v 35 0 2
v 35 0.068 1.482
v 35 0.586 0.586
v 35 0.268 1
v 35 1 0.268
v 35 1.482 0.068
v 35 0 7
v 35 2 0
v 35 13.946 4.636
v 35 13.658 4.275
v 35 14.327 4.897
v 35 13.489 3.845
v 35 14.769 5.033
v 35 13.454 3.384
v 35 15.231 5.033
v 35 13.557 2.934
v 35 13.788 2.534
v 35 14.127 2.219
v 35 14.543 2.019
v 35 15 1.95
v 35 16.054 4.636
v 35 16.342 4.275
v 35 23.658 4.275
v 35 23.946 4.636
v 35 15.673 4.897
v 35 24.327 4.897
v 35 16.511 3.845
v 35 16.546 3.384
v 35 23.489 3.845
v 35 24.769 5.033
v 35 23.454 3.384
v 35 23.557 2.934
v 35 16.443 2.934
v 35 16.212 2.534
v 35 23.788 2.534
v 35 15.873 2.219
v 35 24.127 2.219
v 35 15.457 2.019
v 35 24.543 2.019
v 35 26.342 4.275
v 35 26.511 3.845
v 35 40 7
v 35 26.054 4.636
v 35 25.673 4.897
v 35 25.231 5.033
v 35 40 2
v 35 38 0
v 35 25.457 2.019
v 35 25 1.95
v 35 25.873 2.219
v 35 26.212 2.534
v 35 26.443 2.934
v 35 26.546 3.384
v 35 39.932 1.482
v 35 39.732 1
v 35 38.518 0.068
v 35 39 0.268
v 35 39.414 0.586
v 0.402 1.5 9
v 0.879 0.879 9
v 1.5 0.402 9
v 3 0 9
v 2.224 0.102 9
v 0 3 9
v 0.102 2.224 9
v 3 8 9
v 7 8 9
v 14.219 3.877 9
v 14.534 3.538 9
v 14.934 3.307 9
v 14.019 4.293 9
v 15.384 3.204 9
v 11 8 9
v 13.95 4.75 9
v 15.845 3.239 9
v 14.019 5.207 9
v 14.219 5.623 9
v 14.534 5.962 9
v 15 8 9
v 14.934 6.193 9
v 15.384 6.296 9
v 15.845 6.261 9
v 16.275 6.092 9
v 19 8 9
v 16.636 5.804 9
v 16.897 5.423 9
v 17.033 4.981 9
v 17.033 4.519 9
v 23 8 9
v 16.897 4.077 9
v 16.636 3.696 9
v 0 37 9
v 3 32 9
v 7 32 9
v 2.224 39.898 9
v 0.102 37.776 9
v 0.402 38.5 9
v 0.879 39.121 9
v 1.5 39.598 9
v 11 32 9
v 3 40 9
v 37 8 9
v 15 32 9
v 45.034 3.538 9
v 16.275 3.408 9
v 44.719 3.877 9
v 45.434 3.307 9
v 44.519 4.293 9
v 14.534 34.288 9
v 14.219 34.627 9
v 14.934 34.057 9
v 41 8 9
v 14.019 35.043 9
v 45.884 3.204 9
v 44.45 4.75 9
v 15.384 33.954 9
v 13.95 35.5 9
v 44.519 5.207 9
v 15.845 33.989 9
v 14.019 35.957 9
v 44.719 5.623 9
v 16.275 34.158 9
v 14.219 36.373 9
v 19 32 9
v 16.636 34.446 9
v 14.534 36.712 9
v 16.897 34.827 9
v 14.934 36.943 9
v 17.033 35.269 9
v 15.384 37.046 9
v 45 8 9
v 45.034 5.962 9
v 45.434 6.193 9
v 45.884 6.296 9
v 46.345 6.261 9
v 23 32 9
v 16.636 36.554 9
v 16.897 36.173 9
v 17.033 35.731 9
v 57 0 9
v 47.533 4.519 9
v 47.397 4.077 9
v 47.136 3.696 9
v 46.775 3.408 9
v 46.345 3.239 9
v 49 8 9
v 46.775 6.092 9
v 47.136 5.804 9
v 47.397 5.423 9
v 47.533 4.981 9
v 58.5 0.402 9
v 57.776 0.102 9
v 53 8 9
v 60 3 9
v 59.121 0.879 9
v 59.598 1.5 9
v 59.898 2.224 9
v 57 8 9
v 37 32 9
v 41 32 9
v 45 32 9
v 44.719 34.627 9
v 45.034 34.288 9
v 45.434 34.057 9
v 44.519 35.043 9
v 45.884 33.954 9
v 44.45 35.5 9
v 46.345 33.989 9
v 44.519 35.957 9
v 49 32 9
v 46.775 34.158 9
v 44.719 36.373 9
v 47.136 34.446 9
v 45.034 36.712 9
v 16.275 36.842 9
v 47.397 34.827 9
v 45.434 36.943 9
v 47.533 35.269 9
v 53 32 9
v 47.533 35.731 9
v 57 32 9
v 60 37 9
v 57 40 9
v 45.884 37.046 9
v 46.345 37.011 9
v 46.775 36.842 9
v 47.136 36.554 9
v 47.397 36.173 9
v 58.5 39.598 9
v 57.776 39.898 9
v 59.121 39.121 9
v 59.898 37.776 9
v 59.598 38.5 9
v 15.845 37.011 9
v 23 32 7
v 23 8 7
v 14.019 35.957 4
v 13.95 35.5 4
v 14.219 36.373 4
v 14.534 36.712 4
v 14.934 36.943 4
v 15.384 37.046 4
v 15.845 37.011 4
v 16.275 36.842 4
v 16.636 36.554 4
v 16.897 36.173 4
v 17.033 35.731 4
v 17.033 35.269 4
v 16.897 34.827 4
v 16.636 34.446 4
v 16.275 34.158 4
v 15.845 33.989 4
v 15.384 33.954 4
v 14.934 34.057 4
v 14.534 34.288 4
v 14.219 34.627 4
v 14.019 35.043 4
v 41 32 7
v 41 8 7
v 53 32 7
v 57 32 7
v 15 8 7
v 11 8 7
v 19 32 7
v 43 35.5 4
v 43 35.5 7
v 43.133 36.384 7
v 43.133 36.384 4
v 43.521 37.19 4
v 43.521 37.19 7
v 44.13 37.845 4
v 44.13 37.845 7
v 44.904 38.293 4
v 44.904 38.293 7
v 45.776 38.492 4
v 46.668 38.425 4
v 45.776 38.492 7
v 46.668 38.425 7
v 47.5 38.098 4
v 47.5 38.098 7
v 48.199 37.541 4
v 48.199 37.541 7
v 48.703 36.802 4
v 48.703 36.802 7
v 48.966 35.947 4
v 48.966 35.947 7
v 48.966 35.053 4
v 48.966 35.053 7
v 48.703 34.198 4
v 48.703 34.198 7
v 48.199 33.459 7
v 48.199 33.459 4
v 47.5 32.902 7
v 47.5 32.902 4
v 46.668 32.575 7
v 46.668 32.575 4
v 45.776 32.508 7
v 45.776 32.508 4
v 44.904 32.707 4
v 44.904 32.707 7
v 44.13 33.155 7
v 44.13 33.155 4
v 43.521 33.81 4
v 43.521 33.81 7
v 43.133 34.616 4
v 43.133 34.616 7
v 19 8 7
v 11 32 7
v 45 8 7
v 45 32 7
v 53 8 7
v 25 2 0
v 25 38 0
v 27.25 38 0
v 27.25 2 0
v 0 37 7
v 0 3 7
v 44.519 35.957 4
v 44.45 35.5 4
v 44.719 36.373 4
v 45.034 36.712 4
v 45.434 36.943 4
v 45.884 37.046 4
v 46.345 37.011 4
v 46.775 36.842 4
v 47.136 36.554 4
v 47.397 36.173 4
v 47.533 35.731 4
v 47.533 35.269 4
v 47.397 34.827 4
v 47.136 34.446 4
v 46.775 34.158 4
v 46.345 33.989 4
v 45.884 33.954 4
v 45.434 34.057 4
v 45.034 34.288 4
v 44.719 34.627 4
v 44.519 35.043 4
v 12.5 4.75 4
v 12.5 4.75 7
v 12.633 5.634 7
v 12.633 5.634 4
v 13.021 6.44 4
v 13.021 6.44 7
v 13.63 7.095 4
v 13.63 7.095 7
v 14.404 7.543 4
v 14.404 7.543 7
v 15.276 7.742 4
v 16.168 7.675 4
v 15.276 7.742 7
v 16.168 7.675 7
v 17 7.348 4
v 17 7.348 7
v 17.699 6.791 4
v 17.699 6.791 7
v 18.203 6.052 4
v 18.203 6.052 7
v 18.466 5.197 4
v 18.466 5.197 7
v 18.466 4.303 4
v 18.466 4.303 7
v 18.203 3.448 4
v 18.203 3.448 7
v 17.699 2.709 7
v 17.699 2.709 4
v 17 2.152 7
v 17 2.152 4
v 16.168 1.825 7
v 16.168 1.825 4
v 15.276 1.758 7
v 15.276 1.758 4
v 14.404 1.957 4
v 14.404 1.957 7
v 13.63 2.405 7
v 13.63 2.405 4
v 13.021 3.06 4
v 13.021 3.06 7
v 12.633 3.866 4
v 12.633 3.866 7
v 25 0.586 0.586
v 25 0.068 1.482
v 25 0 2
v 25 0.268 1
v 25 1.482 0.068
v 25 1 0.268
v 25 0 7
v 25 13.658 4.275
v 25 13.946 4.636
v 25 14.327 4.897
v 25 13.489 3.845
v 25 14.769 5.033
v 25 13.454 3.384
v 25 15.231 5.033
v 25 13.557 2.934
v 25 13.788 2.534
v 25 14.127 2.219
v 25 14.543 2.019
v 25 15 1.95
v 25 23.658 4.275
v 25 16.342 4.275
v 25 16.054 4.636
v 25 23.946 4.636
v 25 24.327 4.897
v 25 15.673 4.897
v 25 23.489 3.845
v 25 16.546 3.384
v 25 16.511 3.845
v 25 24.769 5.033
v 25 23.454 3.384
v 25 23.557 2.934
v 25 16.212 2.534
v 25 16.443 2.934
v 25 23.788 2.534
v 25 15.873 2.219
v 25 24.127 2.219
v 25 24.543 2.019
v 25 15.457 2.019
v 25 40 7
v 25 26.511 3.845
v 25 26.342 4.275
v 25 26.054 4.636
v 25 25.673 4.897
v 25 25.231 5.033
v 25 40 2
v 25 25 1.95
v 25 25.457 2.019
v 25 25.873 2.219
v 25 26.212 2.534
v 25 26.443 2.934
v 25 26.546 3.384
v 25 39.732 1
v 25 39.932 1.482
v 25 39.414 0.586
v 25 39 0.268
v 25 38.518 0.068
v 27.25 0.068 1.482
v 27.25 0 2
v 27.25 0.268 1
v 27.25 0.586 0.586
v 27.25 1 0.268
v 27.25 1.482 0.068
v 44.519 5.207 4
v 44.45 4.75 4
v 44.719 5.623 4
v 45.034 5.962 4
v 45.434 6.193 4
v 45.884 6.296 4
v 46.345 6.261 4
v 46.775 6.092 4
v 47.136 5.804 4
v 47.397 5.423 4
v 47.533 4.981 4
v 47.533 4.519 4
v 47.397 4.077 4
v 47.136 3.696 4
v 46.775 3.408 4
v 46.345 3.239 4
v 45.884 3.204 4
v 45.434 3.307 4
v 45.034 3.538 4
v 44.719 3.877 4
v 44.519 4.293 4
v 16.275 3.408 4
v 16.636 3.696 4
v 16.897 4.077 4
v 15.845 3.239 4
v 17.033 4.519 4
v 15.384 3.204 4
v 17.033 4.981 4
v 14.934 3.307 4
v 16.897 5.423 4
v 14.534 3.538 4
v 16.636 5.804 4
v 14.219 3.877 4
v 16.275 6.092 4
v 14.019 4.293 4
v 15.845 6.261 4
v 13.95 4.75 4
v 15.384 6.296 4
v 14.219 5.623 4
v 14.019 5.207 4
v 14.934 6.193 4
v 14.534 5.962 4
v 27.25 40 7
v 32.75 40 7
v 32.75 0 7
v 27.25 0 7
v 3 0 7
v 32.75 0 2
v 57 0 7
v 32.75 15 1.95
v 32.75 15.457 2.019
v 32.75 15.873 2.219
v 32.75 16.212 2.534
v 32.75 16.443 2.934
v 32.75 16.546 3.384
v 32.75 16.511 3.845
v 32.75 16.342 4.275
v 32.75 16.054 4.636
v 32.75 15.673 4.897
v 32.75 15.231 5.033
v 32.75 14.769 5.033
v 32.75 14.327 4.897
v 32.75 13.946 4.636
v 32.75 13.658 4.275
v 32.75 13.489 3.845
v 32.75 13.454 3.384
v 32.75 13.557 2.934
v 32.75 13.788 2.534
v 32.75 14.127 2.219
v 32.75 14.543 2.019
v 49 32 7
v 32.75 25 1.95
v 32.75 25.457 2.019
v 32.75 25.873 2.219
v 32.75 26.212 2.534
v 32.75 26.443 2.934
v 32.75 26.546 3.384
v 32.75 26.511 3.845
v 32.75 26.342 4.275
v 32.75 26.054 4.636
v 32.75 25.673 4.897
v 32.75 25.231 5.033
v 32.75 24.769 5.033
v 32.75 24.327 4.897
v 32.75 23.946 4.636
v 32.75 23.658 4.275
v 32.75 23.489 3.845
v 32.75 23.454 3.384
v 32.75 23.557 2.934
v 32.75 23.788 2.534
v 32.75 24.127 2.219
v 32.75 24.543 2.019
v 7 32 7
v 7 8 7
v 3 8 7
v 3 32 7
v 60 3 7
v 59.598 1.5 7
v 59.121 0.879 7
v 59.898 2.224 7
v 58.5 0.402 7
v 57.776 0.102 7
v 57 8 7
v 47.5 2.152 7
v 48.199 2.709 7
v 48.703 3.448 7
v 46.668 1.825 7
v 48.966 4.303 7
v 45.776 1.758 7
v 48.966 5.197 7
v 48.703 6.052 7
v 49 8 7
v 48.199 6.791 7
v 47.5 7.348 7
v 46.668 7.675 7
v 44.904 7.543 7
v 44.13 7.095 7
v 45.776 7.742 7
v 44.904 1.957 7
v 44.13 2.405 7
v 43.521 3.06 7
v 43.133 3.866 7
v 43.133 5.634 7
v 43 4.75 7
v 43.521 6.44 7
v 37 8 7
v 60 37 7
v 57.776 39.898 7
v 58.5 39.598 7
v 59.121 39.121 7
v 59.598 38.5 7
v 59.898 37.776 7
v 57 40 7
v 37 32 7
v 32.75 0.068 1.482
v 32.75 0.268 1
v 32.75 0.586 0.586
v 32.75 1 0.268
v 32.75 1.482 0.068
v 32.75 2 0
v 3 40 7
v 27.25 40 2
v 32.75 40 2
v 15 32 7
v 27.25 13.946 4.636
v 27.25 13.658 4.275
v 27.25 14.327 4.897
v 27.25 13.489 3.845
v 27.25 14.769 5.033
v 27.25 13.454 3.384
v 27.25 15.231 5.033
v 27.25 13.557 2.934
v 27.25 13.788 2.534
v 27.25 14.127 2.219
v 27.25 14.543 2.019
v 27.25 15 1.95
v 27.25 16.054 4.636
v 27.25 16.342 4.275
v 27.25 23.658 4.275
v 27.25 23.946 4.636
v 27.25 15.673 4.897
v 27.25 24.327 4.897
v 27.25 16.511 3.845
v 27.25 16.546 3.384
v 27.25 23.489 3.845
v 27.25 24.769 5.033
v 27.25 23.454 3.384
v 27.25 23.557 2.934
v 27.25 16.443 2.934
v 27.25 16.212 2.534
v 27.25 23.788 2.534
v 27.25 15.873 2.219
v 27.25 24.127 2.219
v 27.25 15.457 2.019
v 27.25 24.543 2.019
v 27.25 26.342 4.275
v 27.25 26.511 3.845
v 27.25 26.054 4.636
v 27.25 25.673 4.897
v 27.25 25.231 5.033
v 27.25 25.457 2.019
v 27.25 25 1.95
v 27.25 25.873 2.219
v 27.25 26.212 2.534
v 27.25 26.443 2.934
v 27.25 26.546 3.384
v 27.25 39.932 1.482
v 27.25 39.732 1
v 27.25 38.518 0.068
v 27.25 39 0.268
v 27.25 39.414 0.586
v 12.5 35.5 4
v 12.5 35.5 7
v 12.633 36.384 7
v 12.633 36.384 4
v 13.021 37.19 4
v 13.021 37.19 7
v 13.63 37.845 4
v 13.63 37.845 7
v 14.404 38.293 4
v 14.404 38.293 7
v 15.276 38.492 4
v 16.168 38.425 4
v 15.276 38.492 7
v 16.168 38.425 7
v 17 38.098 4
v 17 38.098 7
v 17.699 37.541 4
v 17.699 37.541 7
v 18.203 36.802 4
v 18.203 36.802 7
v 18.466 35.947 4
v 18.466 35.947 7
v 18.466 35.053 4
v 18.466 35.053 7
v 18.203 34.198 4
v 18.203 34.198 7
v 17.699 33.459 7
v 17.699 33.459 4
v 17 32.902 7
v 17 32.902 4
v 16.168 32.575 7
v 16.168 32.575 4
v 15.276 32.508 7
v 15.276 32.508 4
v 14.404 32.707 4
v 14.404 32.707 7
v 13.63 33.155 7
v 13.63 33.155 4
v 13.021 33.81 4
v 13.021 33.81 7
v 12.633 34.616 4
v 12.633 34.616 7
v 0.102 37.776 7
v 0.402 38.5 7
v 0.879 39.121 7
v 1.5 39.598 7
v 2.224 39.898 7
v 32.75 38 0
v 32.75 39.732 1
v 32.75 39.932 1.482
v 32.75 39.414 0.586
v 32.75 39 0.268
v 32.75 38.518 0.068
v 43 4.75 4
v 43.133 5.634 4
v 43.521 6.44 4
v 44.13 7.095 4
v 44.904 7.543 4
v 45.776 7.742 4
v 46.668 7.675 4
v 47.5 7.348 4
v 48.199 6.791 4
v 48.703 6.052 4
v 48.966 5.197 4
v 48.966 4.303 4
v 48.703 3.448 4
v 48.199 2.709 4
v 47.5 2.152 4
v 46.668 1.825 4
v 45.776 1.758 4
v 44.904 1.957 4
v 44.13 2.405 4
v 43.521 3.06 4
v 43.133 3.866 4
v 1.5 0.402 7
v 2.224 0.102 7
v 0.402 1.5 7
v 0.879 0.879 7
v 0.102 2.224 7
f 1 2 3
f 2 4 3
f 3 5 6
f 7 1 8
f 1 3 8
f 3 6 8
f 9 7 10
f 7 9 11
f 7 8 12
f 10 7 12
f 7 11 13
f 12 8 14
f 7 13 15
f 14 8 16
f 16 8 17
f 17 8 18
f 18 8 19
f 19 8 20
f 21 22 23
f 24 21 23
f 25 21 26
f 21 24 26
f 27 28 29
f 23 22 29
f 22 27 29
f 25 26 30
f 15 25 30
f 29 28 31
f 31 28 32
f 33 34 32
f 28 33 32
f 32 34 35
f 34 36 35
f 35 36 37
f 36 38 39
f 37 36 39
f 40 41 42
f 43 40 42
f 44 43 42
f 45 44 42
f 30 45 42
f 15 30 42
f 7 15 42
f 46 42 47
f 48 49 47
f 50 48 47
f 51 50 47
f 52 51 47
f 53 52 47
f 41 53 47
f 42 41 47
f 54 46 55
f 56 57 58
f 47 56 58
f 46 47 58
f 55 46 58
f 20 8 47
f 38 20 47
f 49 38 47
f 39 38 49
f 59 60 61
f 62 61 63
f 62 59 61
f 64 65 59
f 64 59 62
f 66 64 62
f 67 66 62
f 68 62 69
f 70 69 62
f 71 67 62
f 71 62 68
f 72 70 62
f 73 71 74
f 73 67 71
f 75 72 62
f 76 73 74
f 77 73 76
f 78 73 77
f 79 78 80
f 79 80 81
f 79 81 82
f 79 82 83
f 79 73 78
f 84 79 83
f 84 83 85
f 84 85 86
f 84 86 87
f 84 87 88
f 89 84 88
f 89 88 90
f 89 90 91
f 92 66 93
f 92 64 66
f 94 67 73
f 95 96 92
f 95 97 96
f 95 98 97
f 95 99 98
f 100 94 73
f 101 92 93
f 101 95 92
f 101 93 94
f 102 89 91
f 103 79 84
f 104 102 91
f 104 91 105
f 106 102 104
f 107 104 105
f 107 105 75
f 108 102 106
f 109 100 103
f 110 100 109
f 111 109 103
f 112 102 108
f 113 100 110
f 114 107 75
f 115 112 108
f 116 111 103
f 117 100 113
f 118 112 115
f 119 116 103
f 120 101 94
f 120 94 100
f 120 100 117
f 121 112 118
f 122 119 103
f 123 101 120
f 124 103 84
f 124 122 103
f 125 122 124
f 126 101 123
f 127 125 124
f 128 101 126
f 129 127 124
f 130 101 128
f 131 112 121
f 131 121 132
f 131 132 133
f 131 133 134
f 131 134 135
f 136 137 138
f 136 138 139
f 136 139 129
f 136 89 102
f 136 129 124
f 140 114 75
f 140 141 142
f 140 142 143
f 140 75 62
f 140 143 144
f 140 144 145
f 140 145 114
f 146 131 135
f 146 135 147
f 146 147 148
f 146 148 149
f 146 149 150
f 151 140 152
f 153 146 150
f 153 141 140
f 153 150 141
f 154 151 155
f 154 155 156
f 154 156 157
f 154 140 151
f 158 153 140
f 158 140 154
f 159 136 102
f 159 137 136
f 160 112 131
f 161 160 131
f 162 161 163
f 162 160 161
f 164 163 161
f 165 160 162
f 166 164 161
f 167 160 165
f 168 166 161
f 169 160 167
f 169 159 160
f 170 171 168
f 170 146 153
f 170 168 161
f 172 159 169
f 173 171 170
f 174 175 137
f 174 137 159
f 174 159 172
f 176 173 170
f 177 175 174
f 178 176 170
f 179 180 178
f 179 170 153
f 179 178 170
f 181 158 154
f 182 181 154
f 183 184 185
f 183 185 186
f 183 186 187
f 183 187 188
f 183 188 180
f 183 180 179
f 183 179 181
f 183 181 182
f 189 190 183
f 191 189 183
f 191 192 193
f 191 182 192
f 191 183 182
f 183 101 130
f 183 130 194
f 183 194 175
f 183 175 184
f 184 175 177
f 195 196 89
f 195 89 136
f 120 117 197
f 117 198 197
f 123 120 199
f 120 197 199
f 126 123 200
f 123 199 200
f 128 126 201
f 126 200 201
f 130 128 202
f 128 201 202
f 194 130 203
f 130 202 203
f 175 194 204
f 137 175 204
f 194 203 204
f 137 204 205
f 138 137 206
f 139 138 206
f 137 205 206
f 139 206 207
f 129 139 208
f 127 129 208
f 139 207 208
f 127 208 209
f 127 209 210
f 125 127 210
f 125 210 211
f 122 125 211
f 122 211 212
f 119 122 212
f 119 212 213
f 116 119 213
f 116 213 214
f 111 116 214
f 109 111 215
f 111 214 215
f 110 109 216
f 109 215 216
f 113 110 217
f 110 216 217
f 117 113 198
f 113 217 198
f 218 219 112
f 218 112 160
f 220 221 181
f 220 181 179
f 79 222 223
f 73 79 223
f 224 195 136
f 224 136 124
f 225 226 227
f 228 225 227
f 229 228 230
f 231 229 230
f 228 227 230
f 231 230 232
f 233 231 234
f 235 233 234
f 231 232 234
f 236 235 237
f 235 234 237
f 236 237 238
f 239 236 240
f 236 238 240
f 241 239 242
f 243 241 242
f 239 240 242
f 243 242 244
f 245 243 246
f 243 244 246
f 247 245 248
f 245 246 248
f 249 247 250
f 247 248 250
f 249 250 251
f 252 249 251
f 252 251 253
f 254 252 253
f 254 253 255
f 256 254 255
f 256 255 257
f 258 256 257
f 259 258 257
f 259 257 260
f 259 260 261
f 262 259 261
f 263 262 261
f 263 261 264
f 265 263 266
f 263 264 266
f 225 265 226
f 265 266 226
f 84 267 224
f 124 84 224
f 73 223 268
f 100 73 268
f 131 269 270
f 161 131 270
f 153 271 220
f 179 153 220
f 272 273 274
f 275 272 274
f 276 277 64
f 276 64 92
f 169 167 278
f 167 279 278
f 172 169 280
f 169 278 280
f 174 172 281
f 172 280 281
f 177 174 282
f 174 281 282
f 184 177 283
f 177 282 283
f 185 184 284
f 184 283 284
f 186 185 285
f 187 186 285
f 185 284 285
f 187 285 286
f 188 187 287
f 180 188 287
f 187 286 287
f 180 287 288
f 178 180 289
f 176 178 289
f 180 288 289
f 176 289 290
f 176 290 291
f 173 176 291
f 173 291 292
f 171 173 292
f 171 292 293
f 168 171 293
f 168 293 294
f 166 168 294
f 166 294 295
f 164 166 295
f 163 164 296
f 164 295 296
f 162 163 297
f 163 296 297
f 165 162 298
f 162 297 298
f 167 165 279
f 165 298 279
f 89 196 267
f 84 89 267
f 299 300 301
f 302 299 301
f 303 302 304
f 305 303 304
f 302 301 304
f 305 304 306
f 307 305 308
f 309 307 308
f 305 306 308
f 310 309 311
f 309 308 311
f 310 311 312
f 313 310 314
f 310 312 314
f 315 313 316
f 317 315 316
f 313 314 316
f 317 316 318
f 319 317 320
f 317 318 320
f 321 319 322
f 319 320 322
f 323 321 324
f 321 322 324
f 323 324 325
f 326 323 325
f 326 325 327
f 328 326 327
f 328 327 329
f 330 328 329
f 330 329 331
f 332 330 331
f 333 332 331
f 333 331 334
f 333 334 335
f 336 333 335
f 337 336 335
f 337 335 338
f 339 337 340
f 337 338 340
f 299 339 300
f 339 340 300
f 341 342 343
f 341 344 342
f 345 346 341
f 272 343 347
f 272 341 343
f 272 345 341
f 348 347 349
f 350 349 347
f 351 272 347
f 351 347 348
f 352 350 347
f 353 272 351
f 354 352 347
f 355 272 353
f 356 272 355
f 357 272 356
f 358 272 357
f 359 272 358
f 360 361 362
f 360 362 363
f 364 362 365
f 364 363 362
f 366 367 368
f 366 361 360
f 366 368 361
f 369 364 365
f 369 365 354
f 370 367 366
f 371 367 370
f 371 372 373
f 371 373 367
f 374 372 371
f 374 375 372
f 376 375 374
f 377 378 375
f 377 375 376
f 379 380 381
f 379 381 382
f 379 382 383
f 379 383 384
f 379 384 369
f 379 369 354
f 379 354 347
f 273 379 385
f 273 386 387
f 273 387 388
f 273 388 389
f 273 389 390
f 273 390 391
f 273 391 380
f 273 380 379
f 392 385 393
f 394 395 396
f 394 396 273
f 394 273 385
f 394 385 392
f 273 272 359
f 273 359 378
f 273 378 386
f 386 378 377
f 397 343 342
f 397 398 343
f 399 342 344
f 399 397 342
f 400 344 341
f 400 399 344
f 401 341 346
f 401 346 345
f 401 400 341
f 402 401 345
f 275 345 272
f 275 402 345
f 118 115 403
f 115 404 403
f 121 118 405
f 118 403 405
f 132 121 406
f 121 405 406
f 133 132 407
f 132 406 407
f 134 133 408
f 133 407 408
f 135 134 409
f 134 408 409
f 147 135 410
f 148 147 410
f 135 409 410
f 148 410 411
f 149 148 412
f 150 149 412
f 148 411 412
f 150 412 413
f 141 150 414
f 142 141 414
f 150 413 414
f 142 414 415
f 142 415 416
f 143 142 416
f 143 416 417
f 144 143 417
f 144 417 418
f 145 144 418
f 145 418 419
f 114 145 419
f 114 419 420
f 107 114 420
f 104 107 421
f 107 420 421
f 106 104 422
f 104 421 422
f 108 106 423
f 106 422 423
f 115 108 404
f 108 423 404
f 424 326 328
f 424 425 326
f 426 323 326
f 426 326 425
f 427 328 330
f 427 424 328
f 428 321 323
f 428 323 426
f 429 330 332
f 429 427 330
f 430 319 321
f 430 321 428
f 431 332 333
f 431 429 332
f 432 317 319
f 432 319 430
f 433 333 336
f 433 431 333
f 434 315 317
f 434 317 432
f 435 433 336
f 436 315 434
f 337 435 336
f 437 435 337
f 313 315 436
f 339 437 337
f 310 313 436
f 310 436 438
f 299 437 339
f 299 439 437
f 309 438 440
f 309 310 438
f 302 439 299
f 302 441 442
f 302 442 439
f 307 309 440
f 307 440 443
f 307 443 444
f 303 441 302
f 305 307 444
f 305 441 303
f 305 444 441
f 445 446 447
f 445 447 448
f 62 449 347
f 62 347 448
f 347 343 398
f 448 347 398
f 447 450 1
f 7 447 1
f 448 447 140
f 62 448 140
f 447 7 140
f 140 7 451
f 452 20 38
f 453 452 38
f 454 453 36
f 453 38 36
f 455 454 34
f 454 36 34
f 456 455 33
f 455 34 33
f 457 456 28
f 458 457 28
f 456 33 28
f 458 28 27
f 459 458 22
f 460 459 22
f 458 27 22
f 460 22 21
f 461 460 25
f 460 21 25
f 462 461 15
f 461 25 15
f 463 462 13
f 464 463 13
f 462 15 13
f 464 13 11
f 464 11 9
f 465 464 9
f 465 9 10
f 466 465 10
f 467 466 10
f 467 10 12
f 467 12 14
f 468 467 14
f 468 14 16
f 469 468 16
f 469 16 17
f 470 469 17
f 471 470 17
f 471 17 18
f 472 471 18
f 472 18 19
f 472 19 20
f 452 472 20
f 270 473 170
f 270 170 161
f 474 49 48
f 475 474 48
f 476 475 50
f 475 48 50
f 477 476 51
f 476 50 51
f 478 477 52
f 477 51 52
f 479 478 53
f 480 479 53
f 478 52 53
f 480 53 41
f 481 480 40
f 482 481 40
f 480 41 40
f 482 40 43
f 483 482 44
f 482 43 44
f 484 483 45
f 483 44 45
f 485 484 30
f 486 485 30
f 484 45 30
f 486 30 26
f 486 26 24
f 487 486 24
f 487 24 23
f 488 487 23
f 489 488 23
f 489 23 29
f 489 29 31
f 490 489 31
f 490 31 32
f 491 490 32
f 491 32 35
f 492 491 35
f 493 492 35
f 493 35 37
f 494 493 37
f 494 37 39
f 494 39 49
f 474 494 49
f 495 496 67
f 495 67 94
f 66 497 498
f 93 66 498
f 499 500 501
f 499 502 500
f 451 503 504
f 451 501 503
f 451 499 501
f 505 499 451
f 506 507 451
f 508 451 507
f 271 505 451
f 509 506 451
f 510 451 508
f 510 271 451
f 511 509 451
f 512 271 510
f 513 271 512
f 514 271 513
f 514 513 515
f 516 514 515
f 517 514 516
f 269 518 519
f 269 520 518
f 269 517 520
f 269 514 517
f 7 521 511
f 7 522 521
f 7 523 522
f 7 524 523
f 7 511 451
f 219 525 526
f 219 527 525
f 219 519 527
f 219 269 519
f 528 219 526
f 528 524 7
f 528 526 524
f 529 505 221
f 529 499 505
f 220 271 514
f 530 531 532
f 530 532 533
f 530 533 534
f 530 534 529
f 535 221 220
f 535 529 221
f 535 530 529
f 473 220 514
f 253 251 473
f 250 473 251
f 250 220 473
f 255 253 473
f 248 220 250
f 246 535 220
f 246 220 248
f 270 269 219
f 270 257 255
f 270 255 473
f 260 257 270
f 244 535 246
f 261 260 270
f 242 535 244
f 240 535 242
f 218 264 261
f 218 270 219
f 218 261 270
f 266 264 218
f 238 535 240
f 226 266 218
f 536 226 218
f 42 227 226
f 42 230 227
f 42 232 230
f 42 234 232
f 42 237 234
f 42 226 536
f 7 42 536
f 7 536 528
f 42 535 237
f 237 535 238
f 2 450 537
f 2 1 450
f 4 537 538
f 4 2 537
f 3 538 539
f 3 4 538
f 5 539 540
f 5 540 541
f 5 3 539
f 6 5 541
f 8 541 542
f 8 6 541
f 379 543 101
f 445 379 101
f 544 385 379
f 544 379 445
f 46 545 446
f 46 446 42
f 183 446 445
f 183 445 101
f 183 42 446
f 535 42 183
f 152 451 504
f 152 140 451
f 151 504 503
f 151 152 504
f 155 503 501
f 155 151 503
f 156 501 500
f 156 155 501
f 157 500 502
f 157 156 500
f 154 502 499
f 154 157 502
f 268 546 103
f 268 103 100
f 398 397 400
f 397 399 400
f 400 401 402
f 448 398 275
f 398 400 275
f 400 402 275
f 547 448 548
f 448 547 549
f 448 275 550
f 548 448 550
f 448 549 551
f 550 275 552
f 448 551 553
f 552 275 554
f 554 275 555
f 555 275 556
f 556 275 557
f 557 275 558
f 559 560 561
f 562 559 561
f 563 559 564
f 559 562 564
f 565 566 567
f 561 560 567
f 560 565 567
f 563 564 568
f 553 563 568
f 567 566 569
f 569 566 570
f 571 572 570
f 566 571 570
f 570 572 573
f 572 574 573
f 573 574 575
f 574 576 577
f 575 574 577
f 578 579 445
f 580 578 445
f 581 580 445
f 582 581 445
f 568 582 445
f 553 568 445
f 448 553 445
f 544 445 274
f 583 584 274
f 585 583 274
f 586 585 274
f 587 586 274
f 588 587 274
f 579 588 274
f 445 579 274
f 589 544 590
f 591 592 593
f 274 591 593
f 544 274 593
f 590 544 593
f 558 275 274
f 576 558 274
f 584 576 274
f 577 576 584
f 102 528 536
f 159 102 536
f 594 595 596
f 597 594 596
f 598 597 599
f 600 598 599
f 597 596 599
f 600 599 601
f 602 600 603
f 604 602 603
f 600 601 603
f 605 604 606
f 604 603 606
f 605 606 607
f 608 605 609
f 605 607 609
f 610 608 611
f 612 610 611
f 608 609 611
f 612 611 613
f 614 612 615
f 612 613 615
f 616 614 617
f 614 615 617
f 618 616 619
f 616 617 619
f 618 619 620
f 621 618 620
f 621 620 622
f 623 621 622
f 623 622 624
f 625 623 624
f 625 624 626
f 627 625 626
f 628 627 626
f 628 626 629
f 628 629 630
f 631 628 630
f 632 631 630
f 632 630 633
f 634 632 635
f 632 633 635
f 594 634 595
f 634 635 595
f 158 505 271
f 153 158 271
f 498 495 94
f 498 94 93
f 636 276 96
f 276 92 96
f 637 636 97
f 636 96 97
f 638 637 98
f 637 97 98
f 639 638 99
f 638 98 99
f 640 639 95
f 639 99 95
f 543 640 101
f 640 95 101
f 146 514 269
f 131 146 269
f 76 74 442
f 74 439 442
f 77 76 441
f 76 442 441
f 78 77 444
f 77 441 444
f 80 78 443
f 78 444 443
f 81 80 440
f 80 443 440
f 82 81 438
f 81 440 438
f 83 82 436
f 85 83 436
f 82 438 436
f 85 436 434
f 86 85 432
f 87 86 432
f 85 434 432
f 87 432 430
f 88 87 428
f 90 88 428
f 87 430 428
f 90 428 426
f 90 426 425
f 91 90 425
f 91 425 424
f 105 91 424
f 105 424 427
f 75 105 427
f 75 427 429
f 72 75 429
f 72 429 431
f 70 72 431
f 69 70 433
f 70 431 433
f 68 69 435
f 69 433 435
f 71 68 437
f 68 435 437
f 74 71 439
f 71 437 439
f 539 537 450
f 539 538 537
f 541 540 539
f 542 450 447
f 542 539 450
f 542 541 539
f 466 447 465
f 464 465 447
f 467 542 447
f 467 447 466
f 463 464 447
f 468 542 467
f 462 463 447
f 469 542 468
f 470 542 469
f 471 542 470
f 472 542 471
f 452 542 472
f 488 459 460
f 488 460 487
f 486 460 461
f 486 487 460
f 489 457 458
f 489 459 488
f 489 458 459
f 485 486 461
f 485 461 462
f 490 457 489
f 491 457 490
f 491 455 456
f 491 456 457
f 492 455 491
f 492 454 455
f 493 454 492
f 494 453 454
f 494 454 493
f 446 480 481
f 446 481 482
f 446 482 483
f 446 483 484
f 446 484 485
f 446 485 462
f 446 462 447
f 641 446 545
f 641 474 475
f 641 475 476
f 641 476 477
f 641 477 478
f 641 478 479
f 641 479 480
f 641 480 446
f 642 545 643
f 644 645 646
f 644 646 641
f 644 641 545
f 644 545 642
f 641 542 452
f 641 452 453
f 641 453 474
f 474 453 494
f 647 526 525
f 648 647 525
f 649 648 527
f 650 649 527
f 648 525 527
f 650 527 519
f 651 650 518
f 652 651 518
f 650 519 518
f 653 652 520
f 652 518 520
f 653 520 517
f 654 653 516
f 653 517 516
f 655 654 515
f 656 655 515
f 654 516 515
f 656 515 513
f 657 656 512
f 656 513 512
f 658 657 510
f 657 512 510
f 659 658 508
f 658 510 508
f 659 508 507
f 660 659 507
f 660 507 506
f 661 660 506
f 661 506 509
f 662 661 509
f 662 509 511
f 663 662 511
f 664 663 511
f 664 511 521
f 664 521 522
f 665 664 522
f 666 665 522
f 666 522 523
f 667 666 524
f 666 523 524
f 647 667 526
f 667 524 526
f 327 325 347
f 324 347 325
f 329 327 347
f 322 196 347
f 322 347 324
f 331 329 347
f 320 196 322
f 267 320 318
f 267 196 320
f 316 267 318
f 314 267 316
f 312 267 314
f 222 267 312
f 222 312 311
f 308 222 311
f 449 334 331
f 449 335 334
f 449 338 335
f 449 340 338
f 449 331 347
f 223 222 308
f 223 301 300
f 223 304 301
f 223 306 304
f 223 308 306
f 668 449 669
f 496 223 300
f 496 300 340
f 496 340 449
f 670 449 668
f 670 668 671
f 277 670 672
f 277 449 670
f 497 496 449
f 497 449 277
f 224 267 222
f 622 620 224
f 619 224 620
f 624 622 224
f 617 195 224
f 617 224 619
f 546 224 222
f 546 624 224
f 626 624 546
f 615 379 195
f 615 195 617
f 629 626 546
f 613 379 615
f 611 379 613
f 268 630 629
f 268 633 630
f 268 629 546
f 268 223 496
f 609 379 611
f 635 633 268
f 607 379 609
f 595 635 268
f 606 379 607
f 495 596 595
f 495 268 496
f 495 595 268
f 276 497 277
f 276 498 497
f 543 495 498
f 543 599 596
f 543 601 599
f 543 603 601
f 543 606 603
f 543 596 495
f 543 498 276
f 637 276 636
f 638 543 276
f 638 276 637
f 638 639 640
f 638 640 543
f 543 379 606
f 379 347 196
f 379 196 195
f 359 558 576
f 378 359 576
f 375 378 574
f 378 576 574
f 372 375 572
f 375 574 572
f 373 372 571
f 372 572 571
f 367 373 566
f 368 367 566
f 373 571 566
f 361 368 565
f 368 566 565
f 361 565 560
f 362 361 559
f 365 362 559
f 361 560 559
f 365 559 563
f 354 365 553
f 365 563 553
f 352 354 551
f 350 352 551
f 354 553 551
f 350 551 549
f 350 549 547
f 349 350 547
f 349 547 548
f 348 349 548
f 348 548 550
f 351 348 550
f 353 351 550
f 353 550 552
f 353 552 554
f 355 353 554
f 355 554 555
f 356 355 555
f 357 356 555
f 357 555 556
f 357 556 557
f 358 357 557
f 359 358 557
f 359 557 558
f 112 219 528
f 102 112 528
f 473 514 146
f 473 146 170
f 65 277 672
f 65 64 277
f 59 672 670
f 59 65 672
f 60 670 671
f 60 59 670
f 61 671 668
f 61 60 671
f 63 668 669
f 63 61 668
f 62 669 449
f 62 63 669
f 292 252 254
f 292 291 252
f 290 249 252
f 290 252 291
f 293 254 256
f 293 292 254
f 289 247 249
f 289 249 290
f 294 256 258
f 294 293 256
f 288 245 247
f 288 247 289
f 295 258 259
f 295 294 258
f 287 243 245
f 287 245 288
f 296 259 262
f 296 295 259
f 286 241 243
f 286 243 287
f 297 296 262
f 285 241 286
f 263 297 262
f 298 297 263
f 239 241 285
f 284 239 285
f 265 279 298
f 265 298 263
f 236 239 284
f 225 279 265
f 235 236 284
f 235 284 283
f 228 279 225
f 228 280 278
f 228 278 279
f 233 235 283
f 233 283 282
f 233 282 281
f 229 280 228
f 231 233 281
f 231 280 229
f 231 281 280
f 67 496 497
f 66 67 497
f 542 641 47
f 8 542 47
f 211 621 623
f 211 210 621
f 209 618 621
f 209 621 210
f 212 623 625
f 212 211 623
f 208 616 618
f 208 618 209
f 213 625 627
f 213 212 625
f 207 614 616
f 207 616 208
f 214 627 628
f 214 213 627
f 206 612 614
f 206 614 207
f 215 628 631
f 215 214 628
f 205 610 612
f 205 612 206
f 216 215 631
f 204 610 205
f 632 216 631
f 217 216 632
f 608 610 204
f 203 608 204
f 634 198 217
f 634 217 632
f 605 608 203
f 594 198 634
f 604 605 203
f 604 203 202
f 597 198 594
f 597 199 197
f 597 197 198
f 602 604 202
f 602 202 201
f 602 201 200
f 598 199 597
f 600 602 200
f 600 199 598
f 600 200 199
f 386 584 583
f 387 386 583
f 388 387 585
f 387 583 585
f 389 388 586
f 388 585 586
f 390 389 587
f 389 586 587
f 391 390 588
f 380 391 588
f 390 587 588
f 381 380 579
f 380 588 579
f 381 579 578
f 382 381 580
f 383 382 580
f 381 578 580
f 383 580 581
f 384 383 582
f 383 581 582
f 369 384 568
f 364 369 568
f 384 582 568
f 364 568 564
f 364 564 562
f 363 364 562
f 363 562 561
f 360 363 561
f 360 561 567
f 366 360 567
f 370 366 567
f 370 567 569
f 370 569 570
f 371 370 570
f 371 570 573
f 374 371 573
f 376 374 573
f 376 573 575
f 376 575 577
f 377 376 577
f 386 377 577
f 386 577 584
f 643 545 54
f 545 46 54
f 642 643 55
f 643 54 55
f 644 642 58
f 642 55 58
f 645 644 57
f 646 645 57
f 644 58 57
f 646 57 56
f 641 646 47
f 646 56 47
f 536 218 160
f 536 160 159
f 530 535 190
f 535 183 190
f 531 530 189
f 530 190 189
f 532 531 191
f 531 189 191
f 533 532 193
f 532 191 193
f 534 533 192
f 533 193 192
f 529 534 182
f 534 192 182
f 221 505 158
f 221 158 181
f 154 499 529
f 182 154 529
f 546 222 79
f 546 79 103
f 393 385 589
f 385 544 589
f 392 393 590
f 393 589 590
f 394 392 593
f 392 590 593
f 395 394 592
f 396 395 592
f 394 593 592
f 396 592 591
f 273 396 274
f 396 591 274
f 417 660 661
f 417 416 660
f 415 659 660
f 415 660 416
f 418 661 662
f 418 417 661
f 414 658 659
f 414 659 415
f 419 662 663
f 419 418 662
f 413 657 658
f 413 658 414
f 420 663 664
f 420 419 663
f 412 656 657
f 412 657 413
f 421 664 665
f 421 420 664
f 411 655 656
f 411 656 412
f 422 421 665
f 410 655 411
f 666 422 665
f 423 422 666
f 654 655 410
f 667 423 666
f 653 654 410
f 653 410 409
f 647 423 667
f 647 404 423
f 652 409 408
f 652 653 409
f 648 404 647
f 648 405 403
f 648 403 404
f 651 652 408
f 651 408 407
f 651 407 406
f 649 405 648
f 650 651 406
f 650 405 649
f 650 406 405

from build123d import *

# Parameters (mm, degrees)
ESQUISSE1_W                  = 60
ESQUISSE1_H                  = 40
BOSS_EXTRU_1_DEPTH           = 9
ESQUISSE2_W                  = 25
ESQUISSE2_H                  = 40
ESQUISSE2_W_2                = 5.5
ENL_V_MAT_EXTRU_1_DEPTH      = 7
ESQUISSE3_R                  = 1.55
ENL_V_MAT_EXTRU_2_DEPTH      = 36
CONG_1_R                     = 3
ESQUISSE9_R                  = 3
BOSS_EXTRU_2_DEPTH           = 3
ESQUISSE5_R                  = 1.55
ENL_V_MAT_EXTRU_4_DEPTH      = 8
ENL_V_MAT_EXTRU_4_DEPTH_BACK = 3
ESQUISSE8_W                  = 4
ESQUISSE8_H                  = 24
ENL_V_MAT_EXTRU_5_DEPTH      = 7
ESQUISSE6_W                  = 4
ESQUISSE6_H                  = 24
ENL_V_MAT_EXTRU_6_DEPTH      = 7
CONG_2_R                     = 2


with BuildPart() as part:
    # Esquisse1 → Boss.-Extru.1 (new body)
    with BuildSketch(Plane.XY):
        with Locations((30, 20)):
            Rectangle(ESQUISSE1_W, ESQUISSE1_H)
    extrude(amount=BOSS_EXTRU_1_DEPTH)

    # Esquisse2 → Enlèv. mat.-Extru.1 (cut)
    with BuildSketch(Plane(origin=(0, 0, 0), x_dir=(-1, 0, 0), z_dir=(0, 0, -1))):
        with Locations((-12.5, 20)):
            Rectangle(ESQUISSE2_W, ESQUISSE2_H)
        with Locations((-47.5, 20)):
            Rectangle(ESQUISSE2_W, ESQUISSE2_H)
        with Locations((-30, 20)):
            Rectangle(ESQUISSE2_W_2, ESQUISSE2_H)
    extrude(amount=-ENL_V_MAT_EXTRU_1_DEPTH, mode=Mode.SUBTRACT)

    # Esquisse3 → Enlèv. mat.-Extru.2 (cut, through all)
    with BuildSketch(Plane(origin=(35, 0, 0), x_dir=(0, 0, -1), z_dir=(1, 0, 0))):
        with Locations((-3.5, 15)):
            Circle(ESQUISSE3_R)
        with Locations((-3.5, 25)):
            Circle(ESQUISSE3_R)
    extrude(amount=-ENL_V_MAT_EXTRU_2_DEPTH, mode=Mode.SUBTRACT)

    # Congé1
    cong_1_edges = [part.edges().sort_by_distance(p)[0] for p in [
        (0, 40, 8),
        (60, 40, 8),
        (60, 0, 8),
        (0, 0, 8),
    ]]
    fillet(cong_1_edges, radius=CONG_1_R)

    # Esquisse9 → Boss.-Extru.2 (add)
    with BuildSketch(Plane(origin=(0, 0, 7), x_dir=(-1, 0, 0), z_dir=(0, 0, -1))):
        with Locations((-46, 35.5)):
            Circle(ESQUISSE9_R)
        with Locations((-15.5, 35.5)):
            Circle(ESQUISSE9_R)
        with Locations((-15.5, 4.75)):
            Circle(ESQUISSE9_R)
        with Locations((-46, 4.75)):
            Circle(ESQUISSE9_R)
    extrude(amount=BOSS_EXTRU_2_DEPTH)

    # Esquisse5 → Enlèv. mat.-Extru.4 (cut, two sides)
    with BuildSketch(Plane(origin=(0, 0, 7), x_dir=(-1, 0, 0), z_dir=(0, 0, -1))) as enl_v_mat_extru_4_sk:
        with Locations((-46, 35.5)):
            Circle(ESQUISSE5_R)
        with Locations((-46, 4.75)):
            Circle(ESQUISSE5_R)
        with Locations((-15.5, 4.75)):
            Circle(ESQUISSE5_R)
        with Locations((-15.5, 35.5)):
            Circle(ESQUISSE5_R)
    extrude(amount=ENL_V_MAT_EXTRU_4_DEPTH, mode=Mode.SUBTRACT)
    extrude(enl_v_mat_extru_4_sk.sketch, amount=-ENL_V_MAT_EXTRU_4_DEPTH_BACK, mode=Mode.SUBTRACT)

    # Esquisse8 → Enlèv. mat.-Extru.5 (cut)
    with BuildSketch(Plane(origin=(0, 0, 7), x_dir=(-1, 0, 0), z_dir=(0, 0, -1))):
        with Locations((-13, 20)):
            Rectangle(ESQUISSE8_W, ESQUISSE8_H)
        with Locations((-5, 20)):
            Rectangle(ESQUISSE8_W, ESQUISSE8_H)
        with Locations((-21, 20)):
            Rectangle(ESQUISSE8_W, ESQUISSE8_H)
    extrude(amount=-ENL_V_MAT_EXTRU_5_DEPTH, mode=Mode.SUBTRACT)

    # Esquisse6 → Enlèv. mat.-Extru.6 (cut)
    with BuildSketch(Plane(origin=(0, 0, 7), x_dir=(-1, 0, 0), z_dir=(0, 0, -1))):
        with Locations((-47, 20)):
            Rectangle(ESQUISSE6_W, ESQUISSE6_H)
        with Locations((-55, 20)):
            Rectangle(ESQUISSE6_W, ESQUISSE6_H)
        with Locations((-39, 20)):
            Rectangle(ESQUISSE6_W, ESQUISSE6_H)
    extrude(amount=-ENL_V_MAT_EXTRU_6_DEPTH, mode=Mode.SUBTRACT)

    # Congé2
    cong_2_edges = [part.edges().sort_by_distance(p)[0] for p in [
        (33.875, 40, 0),
        (26.125, 40, 0),
        (26.125, 0, 0),
        (33.875, 0, 0),
    ]]
    fillet(cong_2_edges, radius=CONG_2_R)


solid = part.part
